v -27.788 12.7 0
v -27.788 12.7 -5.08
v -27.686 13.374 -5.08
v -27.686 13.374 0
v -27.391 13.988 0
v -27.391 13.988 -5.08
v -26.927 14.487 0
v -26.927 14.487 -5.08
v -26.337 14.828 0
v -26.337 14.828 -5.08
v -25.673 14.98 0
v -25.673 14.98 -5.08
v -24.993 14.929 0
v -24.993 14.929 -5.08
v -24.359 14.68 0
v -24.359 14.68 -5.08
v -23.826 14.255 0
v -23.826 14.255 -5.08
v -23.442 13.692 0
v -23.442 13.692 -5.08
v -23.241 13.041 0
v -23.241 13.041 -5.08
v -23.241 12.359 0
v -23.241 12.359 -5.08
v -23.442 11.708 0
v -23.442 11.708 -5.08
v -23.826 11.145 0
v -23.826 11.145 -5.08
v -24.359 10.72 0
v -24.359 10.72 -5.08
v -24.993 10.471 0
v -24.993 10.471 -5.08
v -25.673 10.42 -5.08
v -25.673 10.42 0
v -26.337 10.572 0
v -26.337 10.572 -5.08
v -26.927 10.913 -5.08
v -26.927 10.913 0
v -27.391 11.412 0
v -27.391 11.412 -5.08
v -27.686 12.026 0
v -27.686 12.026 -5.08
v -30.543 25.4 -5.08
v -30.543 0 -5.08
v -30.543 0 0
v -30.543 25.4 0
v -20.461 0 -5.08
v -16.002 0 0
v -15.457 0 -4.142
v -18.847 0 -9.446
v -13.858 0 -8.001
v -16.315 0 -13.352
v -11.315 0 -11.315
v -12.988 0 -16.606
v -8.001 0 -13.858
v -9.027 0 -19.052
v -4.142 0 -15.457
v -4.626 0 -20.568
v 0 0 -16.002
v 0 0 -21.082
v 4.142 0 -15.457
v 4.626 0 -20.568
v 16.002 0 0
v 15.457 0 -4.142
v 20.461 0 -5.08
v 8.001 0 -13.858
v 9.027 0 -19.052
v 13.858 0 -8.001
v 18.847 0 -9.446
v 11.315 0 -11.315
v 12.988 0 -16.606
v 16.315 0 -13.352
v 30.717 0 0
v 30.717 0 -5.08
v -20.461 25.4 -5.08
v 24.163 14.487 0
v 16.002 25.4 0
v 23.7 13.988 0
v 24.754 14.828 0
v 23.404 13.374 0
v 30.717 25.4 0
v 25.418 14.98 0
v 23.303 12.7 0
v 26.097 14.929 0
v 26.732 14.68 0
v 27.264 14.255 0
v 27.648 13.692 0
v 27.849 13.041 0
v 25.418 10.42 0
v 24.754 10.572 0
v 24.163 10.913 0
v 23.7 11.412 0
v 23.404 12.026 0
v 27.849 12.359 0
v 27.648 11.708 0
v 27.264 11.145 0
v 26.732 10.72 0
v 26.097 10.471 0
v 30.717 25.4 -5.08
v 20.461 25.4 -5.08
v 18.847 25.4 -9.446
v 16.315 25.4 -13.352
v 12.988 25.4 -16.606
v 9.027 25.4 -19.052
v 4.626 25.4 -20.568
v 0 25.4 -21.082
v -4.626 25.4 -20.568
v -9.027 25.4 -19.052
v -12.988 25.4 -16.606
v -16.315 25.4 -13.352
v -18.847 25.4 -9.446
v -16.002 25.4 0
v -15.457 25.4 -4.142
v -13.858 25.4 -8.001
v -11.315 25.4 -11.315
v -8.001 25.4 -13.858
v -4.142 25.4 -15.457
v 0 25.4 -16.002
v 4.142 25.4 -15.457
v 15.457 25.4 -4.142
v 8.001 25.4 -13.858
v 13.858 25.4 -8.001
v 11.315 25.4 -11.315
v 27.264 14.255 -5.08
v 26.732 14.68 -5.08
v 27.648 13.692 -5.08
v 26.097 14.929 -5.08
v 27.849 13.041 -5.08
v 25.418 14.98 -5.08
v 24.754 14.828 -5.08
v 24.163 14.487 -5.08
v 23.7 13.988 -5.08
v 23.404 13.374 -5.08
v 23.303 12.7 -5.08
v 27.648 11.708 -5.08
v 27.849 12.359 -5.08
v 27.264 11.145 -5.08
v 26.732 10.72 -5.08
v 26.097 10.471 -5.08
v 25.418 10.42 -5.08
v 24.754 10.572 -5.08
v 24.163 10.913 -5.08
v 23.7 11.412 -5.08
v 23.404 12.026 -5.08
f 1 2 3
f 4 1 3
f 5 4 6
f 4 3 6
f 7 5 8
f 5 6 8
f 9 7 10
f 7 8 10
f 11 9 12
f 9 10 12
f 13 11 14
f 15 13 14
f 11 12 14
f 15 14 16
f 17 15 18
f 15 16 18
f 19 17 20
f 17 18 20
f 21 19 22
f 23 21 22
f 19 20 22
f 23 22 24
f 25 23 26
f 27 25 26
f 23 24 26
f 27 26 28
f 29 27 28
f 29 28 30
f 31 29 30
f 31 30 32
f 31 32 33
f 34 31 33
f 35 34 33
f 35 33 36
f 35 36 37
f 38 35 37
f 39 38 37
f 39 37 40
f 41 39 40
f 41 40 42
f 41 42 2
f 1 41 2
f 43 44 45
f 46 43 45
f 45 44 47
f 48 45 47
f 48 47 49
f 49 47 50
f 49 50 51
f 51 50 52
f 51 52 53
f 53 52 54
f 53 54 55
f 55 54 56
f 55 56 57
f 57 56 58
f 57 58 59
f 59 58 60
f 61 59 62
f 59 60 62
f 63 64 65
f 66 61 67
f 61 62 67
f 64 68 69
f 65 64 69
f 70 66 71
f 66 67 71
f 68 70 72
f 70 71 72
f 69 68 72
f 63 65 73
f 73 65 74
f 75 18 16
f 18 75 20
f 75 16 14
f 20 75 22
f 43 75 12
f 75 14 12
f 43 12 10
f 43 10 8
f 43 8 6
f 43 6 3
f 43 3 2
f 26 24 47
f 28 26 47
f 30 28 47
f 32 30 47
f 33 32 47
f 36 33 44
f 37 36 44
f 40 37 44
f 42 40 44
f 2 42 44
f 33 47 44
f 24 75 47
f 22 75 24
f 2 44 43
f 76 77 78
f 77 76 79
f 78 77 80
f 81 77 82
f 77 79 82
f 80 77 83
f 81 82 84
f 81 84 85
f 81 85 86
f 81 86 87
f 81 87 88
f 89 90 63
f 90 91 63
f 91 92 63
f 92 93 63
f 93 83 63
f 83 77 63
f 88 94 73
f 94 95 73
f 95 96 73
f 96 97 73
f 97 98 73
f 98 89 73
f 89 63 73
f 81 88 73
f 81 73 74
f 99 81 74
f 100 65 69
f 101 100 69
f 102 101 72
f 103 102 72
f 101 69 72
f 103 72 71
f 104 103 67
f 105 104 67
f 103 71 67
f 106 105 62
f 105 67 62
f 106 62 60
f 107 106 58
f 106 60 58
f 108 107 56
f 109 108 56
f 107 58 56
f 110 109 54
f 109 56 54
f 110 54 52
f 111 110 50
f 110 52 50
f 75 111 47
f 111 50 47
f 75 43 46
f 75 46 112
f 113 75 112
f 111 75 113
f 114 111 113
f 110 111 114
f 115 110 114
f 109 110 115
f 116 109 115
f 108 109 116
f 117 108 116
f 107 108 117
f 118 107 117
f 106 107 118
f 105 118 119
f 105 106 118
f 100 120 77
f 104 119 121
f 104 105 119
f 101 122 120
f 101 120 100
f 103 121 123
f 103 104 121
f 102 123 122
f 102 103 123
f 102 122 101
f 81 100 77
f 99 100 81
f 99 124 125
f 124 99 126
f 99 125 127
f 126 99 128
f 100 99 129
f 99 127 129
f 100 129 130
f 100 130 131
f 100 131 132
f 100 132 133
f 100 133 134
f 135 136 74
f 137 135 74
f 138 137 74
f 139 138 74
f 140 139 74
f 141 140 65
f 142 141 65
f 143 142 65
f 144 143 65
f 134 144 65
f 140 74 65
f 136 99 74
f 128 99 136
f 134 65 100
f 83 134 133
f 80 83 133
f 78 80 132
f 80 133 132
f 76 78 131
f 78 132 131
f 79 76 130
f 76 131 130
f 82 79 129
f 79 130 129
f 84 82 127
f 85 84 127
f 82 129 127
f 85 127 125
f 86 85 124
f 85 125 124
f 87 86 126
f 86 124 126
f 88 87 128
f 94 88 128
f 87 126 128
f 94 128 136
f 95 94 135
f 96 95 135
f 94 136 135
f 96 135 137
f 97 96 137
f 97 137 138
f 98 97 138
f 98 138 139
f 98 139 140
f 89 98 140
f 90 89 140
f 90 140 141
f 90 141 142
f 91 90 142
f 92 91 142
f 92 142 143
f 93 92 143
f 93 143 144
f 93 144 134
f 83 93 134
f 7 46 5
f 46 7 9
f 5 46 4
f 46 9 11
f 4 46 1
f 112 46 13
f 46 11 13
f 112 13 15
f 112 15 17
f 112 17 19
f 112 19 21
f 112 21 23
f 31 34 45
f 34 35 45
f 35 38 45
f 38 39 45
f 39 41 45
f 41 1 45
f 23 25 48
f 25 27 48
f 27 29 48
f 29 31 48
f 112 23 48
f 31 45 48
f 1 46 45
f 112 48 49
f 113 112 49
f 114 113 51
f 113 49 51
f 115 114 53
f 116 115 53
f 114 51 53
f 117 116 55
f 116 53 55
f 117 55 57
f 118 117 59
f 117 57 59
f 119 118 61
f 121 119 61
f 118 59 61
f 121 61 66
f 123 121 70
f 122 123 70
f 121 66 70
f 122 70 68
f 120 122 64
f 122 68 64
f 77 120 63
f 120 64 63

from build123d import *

# Parameters (mm, degrees)
BOSS_EXTRUDE1_DEPTH = 25.4
SKETCH2_R           = 2.286
CUT_EXTRUDE1_DEPTH  = 6.08


with BuildPart() as part:
    # Sketch1 → Boss-Extrude1 (new body)
    with BuildSketch(Plane(origin=(0, 0, 0), x_dir=(1, 0, 0), z_dir=(0, 1, 0))):
        with BuildLine():
            Line((-26.035, 0), (-16.002, 0))
            ThreePointArc((-16.002, 0), (0, 16.002), (16.002, 0))
            Line((16.002, 0), (26.035, 0))
            Line((26.035, 0), (30.716650549, 0))
            Line((30.716650549, 0), (30.716650549, 5.08))
            Line((30.716650549, 5.08), (26.035, 5.08))
            Line((26.035, 5.08), (20.460799691, 5.08))
            ThreePointArc((20.460799691, 5.08), (0, 21.082), (-20.460799691, 5.08))
            Line((-20.460799691, 5.08), (-26.035, 5.08))
            Line((-26.035, 5.08), (-30.543065264, 5.08))
            Line((-30.543065264, 5.08), (-30.543065264, 0))
            Line((-30.543065264, 0), (-26.035, 0))
        make_face()
    extrude(amount=BOSS_EXTRUDE1_DEPTH)

    # Sketch2 → Cut-Extrude1 (cut, through all)
    with BuildSketch(Plane(origin=(0, 0, -5.08), x_dir=(-1, 0, 0), z_dir=(0, 0, -1))):
        with Locations((-25.58872512, 12.7)):
            Circle(SKETCH2_R)
        with Locations((25.501932478, 12.7)):
            Circle(SKETCH2_R)
    extrude(amount=-CUT_EXTRUDE1_DEPTH, mode=Mode.SUBTRACT)


solid = part.part
